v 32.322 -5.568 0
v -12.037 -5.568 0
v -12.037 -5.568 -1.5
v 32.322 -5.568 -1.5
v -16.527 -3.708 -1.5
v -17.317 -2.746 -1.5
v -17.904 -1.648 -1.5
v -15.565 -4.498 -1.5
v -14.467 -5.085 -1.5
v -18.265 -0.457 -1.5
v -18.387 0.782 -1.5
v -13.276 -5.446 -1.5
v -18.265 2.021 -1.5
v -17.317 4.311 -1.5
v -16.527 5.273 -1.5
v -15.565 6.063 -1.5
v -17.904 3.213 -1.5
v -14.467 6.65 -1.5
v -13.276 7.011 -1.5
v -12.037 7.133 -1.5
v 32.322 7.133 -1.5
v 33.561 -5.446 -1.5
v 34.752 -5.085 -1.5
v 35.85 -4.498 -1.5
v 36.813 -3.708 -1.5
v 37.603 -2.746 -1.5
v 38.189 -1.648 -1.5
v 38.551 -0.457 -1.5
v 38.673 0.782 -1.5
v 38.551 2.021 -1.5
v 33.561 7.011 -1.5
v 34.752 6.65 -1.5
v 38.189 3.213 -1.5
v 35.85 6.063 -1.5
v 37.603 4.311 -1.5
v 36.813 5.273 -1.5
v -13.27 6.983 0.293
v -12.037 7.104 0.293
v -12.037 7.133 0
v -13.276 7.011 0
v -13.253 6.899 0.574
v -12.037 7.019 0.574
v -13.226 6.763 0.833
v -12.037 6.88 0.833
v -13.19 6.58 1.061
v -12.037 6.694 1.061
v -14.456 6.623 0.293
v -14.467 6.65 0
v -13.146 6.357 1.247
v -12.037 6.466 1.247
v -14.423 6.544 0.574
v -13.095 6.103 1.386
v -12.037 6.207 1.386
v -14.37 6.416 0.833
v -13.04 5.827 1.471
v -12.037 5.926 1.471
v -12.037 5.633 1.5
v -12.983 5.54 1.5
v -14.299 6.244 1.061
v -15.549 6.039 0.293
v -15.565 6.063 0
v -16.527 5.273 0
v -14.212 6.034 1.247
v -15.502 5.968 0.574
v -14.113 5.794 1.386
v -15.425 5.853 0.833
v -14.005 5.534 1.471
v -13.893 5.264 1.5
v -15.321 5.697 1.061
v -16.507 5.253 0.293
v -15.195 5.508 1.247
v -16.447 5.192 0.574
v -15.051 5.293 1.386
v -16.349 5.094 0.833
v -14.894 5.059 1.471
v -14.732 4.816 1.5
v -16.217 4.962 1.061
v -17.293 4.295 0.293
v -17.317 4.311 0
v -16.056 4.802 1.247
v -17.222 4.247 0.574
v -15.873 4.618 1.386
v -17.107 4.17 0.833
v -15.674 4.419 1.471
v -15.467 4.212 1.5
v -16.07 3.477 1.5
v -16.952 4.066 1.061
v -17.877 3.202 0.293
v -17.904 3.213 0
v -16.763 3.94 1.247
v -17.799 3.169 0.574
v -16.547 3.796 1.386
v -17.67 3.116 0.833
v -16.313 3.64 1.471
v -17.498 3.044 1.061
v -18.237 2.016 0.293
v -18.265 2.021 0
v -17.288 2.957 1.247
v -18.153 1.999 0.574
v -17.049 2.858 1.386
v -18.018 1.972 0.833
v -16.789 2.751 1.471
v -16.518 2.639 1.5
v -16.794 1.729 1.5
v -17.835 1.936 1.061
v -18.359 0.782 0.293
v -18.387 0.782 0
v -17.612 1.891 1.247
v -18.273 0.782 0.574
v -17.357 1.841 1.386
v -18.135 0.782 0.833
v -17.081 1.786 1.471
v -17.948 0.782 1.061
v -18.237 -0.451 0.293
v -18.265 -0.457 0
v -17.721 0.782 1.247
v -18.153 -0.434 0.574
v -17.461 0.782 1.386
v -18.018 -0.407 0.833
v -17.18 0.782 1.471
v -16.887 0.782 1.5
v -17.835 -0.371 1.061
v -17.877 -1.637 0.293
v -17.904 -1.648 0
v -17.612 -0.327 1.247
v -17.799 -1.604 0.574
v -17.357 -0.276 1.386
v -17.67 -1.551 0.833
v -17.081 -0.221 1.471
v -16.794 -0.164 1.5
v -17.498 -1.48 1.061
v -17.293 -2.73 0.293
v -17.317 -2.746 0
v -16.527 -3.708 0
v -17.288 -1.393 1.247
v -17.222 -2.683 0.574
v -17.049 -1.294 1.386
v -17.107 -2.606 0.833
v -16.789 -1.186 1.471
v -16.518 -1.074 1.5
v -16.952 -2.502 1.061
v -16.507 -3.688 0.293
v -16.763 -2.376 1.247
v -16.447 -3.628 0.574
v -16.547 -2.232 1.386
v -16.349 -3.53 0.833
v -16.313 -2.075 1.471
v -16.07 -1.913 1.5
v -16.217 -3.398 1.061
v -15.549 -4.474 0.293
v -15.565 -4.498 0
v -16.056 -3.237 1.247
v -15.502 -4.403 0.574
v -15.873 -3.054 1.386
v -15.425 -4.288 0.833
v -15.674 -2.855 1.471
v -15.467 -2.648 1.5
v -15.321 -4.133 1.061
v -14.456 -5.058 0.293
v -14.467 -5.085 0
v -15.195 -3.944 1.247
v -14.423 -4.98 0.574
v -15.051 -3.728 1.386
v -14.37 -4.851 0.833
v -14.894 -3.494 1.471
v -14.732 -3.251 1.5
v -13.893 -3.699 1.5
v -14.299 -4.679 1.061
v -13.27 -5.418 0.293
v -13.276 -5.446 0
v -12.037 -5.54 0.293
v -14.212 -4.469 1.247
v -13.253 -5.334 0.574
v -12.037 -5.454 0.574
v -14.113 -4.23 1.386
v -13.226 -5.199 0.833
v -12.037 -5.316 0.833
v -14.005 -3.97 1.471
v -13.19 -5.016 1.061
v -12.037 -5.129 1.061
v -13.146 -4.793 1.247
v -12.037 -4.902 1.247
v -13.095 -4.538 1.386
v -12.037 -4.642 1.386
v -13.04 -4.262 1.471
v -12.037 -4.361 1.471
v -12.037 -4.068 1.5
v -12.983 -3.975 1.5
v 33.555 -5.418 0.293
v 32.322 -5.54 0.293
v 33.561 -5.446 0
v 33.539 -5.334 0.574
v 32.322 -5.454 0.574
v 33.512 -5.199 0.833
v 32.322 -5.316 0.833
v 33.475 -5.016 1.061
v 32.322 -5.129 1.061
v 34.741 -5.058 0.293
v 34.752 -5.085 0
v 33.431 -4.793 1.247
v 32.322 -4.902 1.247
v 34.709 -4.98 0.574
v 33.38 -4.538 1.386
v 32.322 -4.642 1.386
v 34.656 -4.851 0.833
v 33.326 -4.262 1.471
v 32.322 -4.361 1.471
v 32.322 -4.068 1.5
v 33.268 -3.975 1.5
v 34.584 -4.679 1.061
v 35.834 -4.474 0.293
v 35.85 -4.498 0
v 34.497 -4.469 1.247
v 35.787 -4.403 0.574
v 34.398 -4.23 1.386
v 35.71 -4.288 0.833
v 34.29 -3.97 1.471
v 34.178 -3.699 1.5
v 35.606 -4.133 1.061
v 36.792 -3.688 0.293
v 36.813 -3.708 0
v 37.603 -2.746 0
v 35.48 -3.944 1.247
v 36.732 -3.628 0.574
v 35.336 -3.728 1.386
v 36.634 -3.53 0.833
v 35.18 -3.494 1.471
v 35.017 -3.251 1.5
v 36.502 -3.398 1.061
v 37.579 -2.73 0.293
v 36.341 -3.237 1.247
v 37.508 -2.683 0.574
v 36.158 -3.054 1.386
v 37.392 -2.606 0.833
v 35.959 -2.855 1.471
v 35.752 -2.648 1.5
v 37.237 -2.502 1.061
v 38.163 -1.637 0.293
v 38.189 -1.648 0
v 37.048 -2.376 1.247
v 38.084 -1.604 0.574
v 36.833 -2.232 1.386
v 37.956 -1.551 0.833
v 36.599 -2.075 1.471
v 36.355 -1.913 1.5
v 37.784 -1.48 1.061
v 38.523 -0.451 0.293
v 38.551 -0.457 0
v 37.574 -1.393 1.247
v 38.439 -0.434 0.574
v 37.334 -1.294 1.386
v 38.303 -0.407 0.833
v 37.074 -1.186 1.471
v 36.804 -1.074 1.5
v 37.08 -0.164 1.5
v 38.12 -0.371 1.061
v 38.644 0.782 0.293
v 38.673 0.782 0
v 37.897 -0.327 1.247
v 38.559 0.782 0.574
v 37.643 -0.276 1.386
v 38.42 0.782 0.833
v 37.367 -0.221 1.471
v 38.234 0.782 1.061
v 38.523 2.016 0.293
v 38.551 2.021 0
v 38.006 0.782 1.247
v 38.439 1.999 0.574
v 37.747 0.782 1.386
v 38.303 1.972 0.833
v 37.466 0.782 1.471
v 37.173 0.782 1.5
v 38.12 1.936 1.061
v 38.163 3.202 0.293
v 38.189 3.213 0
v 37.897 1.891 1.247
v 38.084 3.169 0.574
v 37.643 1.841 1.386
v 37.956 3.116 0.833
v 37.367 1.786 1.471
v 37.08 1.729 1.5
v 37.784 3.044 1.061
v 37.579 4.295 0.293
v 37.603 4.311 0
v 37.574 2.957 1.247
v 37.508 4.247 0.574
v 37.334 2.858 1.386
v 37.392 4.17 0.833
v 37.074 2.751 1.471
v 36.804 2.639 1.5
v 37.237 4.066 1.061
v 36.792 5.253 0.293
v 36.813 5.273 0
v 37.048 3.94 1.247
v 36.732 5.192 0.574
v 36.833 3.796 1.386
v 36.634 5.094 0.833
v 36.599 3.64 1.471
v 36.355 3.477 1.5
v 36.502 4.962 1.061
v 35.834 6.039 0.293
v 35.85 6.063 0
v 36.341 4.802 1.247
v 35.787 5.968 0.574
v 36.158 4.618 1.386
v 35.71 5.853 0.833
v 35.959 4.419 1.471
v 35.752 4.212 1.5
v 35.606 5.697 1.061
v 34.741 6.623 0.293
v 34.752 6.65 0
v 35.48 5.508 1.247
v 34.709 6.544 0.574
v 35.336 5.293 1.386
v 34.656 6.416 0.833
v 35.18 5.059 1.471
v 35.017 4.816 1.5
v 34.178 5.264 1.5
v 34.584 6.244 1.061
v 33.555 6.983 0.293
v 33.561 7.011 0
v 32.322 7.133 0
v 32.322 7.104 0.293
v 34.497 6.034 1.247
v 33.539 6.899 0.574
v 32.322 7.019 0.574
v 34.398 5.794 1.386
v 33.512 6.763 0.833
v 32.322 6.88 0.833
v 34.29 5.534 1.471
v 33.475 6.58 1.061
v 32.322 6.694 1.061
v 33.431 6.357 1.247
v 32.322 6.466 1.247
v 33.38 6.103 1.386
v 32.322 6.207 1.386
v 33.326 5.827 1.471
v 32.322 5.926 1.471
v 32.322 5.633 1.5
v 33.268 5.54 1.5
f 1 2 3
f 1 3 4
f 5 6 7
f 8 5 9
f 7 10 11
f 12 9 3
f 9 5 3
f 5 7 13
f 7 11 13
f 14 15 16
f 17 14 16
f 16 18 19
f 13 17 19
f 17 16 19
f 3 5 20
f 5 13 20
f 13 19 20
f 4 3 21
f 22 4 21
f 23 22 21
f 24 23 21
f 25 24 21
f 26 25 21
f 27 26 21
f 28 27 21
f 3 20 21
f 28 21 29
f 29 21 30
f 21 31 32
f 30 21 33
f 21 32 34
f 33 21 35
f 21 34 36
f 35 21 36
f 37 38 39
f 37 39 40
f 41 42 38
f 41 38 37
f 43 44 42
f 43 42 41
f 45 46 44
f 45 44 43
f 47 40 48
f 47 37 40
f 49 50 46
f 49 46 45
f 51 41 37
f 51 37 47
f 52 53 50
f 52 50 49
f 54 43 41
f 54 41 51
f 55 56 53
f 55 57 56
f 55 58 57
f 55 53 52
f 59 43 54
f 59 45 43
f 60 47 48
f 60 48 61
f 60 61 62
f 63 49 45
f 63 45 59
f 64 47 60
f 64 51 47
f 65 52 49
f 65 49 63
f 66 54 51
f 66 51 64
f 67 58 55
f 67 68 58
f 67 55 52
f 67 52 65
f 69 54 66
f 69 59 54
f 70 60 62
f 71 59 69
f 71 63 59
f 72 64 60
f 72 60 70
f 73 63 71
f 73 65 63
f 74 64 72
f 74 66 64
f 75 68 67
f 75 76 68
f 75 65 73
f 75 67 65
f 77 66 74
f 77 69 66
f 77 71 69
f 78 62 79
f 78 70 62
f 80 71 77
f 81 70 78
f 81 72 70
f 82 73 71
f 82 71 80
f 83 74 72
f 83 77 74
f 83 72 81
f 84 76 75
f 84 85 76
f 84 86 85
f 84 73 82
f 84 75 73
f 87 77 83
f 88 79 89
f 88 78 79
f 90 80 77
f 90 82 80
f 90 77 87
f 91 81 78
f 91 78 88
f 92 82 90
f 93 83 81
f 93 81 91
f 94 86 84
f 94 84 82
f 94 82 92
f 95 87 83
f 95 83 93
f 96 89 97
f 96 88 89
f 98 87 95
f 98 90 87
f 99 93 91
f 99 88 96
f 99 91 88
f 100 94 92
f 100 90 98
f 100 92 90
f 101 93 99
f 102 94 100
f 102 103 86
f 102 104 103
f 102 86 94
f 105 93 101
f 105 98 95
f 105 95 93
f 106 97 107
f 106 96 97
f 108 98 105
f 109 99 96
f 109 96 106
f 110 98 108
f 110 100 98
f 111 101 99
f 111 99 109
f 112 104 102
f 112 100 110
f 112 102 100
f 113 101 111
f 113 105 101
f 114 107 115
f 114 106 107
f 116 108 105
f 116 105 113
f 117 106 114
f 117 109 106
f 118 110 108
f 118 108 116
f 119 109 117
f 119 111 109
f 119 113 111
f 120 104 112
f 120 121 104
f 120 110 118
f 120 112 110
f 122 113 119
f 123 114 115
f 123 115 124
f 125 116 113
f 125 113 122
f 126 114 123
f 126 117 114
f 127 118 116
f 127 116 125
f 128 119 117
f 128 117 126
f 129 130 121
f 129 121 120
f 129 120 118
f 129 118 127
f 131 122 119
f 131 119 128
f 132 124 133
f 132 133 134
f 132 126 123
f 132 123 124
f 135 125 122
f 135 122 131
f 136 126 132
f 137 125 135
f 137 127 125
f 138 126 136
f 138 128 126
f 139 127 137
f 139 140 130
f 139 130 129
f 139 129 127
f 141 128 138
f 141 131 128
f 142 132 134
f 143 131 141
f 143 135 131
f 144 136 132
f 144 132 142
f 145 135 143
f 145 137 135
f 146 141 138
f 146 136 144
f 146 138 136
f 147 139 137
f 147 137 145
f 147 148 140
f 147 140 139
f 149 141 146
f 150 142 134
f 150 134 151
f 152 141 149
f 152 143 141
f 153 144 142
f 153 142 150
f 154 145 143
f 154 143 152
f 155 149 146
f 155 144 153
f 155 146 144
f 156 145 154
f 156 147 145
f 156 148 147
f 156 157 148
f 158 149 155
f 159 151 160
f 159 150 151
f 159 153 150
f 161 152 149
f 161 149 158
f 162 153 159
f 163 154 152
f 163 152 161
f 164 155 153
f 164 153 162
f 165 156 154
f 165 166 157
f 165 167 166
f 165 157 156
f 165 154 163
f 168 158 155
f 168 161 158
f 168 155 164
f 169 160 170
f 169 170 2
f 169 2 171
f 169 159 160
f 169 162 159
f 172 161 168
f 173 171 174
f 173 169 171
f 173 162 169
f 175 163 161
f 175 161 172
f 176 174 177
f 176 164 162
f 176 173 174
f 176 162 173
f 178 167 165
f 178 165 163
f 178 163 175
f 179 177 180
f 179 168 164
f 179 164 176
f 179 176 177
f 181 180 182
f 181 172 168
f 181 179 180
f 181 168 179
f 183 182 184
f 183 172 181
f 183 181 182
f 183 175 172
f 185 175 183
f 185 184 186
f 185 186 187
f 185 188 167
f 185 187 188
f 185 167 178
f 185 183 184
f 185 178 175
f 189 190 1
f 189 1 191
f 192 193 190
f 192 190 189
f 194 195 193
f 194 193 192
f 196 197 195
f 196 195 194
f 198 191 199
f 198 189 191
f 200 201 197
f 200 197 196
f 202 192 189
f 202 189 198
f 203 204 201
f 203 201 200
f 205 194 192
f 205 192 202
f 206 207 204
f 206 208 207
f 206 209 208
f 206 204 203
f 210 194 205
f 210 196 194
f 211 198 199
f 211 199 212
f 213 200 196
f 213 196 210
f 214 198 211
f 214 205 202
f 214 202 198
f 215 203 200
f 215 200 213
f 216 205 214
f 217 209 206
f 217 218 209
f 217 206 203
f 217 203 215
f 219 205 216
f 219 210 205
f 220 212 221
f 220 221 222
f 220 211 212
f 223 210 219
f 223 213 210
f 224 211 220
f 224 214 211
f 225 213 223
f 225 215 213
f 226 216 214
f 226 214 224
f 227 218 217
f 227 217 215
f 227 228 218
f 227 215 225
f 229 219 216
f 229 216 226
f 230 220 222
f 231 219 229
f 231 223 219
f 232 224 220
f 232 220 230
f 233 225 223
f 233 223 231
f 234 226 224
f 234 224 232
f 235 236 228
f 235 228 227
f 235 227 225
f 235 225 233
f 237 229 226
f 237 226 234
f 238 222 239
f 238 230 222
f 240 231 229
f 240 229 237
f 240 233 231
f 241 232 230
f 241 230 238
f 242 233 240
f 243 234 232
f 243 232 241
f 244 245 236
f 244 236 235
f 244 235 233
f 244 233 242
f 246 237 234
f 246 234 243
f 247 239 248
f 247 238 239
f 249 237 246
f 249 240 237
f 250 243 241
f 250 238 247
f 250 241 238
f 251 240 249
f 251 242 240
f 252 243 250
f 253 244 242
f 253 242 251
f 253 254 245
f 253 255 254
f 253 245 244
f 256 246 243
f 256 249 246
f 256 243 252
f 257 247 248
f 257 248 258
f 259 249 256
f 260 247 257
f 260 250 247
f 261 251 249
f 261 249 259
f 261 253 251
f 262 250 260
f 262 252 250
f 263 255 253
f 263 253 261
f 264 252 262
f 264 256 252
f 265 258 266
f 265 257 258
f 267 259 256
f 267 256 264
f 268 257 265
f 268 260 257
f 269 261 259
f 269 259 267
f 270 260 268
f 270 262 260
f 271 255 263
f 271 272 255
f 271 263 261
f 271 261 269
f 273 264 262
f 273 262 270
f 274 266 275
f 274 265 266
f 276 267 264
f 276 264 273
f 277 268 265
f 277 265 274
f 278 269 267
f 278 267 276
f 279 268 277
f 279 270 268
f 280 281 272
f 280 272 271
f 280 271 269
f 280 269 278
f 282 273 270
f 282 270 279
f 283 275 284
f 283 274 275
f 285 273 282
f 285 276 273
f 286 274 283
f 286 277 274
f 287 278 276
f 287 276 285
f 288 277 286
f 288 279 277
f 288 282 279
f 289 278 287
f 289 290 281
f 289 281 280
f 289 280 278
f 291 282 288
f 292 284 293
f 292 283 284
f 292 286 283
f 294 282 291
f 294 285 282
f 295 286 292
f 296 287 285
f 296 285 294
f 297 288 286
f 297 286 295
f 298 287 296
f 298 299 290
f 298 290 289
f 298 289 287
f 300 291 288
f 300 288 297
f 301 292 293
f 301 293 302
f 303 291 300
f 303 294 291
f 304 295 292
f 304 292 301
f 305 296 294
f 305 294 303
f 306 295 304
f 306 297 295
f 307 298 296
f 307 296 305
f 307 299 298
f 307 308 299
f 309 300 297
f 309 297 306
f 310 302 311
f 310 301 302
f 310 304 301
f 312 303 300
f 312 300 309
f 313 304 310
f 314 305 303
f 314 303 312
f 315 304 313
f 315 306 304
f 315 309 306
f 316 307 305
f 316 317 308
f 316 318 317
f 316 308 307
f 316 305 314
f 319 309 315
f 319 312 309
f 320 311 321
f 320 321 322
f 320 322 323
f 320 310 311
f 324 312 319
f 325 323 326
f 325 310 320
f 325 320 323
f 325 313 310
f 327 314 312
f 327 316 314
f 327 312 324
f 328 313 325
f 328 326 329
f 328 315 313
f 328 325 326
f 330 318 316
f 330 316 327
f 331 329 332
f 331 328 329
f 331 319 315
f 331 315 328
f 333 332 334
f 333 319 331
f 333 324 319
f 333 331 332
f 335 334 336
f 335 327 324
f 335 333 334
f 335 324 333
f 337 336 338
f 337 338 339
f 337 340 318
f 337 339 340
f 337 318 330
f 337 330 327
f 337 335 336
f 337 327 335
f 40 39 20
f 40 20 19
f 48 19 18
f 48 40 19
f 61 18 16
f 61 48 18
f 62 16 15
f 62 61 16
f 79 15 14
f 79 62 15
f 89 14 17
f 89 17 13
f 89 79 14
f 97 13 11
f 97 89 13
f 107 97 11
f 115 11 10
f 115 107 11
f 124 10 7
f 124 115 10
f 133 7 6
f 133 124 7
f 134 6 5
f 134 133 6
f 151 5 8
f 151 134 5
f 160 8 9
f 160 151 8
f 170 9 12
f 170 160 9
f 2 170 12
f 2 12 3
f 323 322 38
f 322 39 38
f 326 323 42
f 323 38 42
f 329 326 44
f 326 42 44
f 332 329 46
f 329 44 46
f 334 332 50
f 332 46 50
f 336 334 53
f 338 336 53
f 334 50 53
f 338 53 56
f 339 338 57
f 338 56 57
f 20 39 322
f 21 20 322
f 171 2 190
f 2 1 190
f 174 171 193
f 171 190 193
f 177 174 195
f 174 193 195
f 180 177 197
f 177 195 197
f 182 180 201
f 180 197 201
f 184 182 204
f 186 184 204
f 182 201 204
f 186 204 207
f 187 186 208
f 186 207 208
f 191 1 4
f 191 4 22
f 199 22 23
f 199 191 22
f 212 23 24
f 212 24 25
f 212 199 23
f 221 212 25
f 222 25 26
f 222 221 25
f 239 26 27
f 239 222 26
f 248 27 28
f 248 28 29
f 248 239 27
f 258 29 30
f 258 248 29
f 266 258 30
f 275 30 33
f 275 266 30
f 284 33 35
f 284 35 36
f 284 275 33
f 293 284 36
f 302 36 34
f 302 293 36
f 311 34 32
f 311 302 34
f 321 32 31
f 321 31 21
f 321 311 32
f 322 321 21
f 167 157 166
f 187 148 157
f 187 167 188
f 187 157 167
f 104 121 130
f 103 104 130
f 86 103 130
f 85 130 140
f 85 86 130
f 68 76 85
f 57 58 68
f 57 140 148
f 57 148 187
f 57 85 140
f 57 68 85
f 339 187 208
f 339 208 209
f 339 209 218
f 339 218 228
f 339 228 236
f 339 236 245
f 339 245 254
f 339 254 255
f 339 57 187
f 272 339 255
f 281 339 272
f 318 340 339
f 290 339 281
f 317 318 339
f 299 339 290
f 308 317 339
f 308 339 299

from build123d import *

# Parameters (mm, degrees)
F0_W     = 44.358856976
F0_H     = 12.7014997415
F1_DEPTH = 1.5
F2_R     = 1.5


# Not quite as in the source:
# - a feature names something its author has since deleted; it is built from what else it names


with BuildPart() as f1:
    # F0 (on Top) → F1 (new body, symmetric)
    with BuildSketch(Plane.XY):
        with Locations((10.1427063346, 0.782278832)):
            Rectangle(F0_W, F0_H)
        with BuildLine():
            ThreePointArc((-12.0367221534, 7.1330287028), (-18.3874720242, 0.782278832), (-12.0367221534, -5.5684710387))
            Line((-12.0367221534, -5.5684710387), (-12.0367221534, 7.1330287028))
        make_face()
        with BuildLine():
            Line((32.3221348226, 7.1330287028), (32.3221348226, -5.5684710387))
            ThreePointArc((32.3221348226, -5.5684710387), (38.6728846934, 0.782278832), (32.3221348226, 7.1330287028))
        make_face()
    extrude(amount=F1_DEPTH, both=True)

    # F2
    f2_edges = [f1.edges().sort_by_distance(p)[0] for p in [
        (10.142706, -5.568471, 1.5),
        (10.142706, 7.133029, 1.5),
        (38.672885, 0.782279, 1.5),
    ]]
    fillet(f2_edges, radius=F2_R)


solid = f1.part
